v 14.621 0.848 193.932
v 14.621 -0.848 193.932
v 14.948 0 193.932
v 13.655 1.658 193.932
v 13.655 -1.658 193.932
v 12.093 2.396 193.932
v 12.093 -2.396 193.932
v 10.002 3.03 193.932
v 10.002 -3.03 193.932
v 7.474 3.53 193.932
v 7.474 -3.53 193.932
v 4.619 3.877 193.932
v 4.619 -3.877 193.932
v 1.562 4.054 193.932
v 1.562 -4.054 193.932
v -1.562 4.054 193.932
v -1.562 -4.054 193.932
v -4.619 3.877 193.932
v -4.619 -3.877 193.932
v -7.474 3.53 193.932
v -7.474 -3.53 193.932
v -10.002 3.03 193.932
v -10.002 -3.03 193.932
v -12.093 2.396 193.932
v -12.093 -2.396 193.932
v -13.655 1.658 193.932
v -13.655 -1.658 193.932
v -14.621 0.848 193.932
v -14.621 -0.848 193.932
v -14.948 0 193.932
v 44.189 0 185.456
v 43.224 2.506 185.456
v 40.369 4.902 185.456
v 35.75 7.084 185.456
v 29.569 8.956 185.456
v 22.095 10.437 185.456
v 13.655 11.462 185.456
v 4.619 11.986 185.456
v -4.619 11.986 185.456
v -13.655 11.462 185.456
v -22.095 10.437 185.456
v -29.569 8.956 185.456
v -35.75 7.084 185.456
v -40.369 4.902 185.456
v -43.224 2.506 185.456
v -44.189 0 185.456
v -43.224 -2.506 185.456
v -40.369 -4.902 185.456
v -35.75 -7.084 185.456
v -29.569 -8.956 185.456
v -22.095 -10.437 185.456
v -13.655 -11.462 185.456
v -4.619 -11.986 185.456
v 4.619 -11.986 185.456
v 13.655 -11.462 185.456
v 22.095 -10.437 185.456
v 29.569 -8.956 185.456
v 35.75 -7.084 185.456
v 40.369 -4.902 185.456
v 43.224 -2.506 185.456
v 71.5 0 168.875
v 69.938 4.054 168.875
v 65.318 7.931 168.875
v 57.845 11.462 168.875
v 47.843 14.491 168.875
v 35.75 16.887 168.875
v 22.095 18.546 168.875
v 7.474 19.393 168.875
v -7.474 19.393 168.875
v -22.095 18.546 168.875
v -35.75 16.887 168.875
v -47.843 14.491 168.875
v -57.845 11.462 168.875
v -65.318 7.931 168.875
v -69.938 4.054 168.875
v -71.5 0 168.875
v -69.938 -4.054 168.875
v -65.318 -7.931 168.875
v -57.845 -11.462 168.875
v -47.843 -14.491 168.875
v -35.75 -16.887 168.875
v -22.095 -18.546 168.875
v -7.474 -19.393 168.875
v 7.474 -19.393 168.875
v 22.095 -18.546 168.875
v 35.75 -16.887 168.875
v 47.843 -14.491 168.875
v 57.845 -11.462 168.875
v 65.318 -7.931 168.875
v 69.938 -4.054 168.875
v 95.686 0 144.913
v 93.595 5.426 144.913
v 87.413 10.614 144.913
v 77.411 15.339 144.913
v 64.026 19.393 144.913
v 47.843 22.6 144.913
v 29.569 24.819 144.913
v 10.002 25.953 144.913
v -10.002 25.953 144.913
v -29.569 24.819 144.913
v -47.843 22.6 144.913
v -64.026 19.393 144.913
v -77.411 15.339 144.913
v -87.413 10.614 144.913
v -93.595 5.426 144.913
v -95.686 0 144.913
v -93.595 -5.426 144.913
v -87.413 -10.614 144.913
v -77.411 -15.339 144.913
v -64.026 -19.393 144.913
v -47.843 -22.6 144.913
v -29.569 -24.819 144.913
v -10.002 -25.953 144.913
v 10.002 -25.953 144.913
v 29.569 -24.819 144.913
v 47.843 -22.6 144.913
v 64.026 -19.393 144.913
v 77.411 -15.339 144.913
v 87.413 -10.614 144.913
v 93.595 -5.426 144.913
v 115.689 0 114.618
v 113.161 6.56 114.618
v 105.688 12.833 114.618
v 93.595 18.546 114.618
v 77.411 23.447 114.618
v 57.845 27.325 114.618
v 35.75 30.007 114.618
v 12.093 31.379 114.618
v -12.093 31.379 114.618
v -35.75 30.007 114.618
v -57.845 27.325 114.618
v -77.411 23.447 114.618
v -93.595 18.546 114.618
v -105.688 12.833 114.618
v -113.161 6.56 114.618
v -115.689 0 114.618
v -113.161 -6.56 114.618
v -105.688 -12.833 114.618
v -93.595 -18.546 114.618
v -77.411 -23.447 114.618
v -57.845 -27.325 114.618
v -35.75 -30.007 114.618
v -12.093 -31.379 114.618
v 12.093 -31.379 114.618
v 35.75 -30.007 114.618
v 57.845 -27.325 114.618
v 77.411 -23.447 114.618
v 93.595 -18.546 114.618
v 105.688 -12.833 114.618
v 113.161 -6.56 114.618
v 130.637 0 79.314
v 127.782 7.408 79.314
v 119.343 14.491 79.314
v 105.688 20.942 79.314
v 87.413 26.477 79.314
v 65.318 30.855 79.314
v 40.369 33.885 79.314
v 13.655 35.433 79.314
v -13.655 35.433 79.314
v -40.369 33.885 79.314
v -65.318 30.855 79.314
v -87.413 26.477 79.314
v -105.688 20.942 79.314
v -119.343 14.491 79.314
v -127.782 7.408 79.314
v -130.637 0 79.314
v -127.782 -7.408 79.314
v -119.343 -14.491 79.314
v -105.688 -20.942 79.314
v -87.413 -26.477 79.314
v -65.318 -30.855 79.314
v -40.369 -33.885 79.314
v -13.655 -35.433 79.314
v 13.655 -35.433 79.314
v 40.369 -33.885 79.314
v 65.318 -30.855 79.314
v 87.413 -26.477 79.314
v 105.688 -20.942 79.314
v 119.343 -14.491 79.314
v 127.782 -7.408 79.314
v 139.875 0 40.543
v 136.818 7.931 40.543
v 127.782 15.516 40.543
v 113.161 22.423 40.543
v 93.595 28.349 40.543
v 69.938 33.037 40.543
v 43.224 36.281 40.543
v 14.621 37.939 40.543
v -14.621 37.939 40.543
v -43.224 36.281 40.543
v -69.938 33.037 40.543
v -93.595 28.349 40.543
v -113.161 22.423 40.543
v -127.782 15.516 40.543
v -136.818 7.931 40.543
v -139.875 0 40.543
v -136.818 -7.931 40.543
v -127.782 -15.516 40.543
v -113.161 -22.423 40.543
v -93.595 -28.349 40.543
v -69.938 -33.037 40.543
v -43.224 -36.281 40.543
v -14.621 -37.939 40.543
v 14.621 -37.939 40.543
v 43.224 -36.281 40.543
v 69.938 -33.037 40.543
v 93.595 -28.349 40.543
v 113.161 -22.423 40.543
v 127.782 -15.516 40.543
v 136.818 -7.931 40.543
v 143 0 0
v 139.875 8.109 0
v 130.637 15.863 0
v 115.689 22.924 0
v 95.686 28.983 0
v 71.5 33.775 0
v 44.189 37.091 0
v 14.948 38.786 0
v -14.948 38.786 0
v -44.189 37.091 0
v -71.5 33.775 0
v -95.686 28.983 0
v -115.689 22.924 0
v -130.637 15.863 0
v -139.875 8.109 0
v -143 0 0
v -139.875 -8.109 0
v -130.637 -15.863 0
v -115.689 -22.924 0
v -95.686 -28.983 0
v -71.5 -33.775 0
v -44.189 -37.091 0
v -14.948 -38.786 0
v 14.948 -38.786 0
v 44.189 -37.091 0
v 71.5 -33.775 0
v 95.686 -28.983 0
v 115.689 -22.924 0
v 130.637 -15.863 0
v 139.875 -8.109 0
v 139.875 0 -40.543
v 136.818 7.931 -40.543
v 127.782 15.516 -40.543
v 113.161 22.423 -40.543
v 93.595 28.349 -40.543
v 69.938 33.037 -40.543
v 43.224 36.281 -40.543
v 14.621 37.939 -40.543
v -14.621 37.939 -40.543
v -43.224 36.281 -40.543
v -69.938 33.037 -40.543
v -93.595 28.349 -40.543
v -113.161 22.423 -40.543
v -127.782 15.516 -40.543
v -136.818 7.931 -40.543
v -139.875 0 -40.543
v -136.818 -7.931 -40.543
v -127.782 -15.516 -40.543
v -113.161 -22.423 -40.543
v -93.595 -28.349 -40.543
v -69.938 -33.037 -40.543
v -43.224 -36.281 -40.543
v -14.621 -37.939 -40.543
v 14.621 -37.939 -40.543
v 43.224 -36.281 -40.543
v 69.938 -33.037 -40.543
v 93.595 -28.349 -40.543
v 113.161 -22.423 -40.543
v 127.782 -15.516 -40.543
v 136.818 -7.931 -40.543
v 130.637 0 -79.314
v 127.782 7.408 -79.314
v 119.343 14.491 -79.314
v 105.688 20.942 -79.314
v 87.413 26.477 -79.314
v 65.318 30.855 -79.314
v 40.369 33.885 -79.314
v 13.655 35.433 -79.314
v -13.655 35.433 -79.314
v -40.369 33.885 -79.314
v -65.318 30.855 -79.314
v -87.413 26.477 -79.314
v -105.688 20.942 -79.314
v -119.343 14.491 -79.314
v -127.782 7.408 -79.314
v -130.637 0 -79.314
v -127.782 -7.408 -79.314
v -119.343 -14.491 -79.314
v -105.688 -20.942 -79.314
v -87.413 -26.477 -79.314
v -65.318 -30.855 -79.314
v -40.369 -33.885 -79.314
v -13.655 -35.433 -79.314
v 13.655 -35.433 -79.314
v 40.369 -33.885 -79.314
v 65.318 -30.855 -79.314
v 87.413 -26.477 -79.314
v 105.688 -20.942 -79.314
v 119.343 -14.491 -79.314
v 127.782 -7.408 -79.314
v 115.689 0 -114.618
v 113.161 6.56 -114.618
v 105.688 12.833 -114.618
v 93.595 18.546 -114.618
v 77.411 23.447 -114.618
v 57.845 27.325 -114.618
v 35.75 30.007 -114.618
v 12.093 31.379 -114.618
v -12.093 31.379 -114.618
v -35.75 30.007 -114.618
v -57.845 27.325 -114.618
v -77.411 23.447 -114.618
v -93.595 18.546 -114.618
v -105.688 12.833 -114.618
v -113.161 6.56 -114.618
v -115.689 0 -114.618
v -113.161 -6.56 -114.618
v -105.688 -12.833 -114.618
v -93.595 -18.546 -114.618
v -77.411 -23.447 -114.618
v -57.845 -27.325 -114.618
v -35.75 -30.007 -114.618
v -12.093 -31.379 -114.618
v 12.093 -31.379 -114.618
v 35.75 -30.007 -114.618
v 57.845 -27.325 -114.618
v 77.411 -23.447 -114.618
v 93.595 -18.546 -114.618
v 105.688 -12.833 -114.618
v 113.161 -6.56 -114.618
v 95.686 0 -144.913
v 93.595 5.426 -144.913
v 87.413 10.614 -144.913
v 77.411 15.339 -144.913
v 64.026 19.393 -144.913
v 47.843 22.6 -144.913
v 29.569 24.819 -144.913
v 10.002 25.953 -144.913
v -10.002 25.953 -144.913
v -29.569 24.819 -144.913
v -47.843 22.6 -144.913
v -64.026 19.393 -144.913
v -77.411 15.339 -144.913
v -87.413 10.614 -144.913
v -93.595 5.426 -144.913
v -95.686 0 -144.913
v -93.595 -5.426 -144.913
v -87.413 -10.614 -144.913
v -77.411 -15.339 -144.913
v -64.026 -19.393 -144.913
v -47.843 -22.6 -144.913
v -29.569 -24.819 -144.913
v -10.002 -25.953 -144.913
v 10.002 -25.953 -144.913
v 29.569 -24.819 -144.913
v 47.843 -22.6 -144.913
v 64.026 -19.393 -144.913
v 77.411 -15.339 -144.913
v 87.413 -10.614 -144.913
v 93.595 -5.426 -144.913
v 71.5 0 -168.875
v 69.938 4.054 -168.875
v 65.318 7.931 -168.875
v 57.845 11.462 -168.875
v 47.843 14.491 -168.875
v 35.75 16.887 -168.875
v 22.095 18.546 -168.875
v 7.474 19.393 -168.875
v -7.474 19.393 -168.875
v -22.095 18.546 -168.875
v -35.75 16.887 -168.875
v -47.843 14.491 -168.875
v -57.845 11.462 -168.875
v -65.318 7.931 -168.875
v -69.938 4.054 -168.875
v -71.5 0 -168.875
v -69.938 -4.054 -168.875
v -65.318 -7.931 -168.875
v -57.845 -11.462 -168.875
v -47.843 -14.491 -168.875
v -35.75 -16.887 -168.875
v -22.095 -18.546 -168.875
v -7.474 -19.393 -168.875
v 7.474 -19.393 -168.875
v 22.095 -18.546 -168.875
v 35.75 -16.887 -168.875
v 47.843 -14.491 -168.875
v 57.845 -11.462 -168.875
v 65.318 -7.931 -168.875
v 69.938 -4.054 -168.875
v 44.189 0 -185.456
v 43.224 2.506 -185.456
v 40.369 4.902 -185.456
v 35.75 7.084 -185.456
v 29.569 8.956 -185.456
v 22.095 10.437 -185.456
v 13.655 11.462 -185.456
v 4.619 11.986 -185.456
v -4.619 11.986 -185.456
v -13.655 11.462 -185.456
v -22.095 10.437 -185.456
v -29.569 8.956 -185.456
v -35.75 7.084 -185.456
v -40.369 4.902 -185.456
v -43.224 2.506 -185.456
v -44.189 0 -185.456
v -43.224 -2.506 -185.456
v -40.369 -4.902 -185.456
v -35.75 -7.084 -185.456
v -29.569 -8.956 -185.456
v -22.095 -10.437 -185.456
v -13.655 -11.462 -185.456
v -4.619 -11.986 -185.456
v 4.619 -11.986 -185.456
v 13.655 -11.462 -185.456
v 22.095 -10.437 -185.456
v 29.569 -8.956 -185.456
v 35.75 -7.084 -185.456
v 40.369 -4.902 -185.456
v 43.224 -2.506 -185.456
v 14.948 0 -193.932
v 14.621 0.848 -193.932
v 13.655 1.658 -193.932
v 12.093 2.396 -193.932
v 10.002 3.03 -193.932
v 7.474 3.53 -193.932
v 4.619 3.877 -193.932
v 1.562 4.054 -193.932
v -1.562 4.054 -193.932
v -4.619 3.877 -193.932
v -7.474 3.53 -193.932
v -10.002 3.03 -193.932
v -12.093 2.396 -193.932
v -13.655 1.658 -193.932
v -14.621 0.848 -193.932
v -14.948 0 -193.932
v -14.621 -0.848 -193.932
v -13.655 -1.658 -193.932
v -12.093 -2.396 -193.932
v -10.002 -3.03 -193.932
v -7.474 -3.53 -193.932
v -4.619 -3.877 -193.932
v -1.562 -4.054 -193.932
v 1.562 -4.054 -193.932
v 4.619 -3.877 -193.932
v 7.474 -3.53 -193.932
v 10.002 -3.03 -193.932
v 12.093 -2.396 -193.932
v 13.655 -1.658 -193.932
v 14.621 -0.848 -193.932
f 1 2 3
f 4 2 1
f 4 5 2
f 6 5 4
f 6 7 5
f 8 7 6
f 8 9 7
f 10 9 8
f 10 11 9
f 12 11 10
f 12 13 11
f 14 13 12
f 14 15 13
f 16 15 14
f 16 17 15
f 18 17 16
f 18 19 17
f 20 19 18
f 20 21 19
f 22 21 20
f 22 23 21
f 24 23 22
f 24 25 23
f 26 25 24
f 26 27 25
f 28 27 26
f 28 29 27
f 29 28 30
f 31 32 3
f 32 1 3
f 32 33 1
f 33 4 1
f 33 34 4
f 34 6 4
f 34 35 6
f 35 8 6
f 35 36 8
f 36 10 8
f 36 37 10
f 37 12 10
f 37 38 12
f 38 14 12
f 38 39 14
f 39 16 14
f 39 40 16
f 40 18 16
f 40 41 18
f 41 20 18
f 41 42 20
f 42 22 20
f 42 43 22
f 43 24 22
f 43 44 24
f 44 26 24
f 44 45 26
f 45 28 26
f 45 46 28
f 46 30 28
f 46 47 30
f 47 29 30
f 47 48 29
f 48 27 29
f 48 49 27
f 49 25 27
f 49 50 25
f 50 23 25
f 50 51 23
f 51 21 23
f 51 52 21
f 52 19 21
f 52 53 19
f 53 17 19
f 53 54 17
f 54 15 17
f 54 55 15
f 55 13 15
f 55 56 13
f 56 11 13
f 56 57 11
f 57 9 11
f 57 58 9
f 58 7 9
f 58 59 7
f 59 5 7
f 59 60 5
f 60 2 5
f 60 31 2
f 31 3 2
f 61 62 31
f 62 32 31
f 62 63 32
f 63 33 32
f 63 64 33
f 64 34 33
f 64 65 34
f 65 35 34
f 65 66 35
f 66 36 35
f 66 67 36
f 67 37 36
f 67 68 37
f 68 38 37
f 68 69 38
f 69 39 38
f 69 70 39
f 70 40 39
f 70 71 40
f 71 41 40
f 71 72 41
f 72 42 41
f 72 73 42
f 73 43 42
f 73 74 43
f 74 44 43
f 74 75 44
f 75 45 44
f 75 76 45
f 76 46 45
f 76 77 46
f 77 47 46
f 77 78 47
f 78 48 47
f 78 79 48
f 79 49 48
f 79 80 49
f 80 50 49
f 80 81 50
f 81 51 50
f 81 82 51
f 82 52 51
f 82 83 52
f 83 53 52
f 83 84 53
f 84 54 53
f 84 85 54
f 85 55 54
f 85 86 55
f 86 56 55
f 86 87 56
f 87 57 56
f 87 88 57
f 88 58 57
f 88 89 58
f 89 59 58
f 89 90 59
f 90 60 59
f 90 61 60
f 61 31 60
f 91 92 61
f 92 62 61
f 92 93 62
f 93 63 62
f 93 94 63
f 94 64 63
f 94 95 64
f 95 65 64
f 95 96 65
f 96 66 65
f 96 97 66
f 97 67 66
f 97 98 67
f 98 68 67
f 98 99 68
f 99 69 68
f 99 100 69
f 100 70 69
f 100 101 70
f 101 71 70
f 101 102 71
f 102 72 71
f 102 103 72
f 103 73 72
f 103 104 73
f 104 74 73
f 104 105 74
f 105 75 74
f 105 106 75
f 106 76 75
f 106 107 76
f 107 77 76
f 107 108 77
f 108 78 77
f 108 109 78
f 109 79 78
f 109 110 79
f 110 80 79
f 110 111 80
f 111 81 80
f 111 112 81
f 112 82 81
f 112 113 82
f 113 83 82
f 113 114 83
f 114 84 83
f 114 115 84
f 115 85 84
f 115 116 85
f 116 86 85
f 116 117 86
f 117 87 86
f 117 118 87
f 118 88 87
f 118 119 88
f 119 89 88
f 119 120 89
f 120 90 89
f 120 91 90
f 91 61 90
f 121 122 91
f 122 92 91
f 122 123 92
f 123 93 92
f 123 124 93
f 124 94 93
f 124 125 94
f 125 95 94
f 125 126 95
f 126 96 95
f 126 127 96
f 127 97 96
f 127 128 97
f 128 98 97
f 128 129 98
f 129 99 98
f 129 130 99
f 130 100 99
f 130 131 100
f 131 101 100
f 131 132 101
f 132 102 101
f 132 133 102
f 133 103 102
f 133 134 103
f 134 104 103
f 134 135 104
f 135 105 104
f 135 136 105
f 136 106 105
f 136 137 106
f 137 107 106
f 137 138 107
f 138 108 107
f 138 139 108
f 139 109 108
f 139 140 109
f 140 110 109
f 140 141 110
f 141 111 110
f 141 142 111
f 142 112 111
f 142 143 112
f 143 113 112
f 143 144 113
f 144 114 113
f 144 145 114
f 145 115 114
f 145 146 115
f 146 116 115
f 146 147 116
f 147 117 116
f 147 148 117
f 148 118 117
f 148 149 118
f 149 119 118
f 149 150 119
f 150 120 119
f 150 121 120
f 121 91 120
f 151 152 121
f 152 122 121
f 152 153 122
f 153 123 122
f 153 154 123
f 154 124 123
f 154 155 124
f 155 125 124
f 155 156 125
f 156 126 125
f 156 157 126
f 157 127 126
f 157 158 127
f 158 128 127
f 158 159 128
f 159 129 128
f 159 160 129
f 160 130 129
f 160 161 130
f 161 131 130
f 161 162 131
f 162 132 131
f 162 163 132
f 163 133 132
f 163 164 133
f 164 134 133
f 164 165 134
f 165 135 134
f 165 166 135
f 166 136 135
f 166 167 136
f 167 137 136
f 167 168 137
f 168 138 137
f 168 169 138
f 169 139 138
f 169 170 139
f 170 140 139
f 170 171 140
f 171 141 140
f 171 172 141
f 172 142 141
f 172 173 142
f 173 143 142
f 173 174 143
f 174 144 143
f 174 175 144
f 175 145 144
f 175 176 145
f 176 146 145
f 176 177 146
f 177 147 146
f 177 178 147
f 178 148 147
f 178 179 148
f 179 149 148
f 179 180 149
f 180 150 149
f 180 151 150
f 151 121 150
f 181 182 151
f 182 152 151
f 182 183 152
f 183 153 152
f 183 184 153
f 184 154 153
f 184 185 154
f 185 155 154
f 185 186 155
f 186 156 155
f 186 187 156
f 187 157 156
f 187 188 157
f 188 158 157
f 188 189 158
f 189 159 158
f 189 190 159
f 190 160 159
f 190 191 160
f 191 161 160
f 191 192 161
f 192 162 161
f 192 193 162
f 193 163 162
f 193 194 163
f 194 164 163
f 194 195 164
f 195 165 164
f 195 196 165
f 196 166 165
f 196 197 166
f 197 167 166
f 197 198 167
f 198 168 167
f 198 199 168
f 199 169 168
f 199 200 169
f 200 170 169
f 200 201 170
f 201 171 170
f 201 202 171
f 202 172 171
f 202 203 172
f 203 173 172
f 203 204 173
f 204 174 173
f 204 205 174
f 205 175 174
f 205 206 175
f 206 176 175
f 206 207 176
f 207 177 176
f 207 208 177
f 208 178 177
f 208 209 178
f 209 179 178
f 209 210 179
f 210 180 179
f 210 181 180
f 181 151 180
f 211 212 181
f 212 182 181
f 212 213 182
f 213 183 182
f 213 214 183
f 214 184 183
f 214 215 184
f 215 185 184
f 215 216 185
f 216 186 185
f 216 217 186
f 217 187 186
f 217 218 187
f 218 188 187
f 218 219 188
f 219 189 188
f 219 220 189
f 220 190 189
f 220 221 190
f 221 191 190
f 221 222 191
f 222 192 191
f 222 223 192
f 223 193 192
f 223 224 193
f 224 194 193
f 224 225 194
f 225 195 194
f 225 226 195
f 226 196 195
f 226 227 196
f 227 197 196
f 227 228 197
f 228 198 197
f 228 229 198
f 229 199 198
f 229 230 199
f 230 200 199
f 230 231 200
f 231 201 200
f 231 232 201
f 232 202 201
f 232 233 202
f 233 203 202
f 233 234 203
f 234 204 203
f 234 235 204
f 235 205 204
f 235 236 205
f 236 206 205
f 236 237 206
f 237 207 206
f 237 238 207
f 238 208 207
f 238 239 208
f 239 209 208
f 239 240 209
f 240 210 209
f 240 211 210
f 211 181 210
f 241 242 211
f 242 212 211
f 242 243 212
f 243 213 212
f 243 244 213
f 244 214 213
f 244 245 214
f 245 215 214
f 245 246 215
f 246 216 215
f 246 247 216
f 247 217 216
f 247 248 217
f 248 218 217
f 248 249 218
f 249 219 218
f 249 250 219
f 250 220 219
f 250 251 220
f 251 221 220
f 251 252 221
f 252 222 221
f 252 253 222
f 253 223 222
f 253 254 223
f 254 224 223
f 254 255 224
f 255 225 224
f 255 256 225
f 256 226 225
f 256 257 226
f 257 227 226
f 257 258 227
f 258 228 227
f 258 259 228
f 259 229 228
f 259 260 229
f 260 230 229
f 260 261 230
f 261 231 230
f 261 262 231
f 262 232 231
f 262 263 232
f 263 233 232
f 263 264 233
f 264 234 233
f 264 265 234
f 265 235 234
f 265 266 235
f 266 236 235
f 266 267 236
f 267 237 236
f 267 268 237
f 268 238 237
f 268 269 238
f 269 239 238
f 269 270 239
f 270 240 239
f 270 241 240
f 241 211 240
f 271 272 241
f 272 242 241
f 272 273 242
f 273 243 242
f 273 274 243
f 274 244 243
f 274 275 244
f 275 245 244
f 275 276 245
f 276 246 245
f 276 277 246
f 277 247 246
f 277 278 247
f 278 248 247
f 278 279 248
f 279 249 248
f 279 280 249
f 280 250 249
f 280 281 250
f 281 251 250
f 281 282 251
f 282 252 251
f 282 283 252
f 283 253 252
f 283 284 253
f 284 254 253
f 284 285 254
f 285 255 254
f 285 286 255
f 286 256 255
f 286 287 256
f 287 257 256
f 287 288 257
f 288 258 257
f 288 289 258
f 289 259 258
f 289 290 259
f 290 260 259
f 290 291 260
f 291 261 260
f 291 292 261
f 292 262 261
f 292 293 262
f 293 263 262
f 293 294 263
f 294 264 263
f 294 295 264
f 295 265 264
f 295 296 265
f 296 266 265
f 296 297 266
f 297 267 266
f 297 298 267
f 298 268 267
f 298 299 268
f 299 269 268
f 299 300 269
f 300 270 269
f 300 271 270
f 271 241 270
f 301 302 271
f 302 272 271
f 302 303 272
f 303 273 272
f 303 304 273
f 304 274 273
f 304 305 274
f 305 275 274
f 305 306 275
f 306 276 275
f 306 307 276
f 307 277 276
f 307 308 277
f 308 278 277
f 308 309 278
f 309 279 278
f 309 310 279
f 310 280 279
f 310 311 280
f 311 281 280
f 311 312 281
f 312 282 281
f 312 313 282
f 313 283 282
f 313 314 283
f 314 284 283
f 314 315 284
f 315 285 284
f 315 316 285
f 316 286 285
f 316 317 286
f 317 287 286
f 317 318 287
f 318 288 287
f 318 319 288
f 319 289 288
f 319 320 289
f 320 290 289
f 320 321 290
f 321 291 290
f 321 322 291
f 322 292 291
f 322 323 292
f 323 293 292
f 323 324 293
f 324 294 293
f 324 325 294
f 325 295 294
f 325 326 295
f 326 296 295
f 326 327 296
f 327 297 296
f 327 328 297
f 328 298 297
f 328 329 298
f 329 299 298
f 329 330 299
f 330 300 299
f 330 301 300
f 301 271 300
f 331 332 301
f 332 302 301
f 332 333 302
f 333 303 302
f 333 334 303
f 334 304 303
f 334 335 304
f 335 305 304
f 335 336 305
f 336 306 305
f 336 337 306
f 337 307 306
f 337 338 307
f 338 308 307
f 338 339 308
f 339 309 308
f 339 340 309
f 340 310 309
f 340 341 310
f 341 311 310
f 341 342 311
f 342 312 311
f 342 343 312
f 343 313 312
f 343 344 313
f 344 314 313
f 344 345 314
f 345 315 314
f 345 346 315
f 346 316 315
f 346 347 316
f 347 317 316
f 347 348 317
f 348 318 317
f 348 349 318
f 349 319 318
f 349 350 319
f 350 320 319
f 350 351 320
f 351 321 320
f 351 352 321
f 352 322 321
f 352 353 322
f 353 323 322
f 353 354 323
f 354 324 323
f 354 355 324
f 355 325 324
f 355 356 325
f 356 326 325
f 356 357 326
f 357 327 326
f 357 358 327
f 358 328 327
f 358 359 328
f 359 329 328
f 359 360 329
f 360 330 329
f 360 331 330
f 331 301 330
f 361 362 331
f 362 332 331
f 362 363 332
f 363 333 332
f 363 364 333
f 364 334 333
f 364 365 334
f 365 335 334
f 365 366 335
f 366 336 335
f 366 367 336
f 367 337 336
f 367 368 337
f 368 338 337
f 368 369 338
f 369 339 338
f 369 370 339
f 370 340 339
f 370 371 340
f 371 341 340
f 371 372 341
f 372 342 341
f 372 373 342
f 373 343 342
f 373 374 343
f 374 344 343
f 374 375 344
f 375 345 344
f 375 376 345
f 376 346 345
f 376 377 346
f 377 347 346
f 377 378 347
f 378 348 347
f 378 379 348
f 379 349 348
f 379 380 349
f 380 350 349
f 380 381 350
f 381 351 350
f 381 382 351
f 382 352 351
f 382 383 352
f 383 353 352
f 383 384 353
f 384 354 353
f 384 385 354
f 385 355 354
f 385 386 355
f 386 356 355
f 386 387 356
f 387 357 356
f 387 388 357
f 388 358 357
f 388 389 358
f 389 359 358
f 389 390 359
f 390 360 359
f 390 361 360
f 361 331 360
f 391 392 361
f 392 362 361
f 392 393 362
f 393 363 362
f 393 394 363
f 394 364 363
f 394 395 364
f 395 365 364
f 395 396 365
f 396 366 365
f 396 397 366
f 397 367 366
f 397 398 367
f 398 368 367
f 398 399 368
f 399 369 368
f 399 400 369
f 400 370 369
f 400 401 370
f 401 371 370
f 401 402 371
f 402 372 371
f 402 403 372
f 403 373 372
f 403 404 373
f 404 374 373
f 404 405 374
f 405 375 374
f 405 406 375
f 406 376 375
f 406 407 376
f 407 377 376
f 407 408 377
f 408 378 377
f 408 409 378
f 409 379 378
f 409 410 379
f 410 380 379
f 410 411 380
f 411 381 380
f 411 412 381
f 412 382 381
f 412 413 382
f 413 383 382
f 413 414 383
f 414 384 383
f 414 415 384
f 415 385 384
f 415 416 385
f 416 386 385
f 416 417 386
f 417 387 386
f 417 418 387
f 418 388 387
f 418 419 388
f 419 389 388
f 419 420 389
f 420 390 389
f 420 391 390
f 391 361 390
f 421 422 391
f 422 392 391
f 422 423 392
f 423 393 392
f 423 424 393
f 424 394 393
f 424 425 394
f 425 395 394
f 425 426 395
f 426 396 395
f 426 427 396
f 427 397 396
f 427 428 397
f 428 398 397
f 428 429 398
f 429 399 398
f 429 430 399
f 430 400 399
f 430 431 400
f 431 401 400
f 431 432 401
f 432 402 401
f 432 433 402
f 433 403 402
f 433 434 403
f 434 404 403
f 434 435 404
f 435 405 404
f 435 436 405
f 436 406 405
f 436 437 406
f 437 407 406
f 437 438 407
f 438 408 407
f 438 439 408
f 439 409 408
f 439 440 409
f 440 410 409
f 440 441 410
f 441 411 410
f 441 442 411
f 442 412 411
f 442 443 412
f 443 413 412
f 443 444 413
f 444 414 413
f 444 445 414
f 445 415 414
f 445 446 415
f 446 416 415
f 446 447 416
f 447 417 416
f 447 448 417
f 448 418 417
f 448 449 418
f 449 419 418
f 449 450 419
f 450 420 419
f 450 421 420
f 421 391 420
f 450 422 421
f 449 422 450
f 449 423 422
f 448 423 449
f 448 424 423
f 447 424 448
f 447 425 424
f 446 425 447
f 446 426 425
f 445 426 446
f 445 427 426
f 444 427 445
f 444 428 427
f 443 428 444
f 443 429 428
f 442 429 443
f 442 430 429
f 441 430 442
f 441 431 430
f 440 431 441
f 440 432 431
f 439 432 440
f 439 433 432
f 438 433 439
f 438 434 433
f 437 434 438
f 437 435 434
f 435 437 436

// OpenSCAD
// Generated by SolidPython 1.0.1 on 2020-07-29 00:46:49


scale(v = [11, 3, 15]) {
	sphere(r = 13);
}
/***********************************************
*********      SolidPython code:      **********
************************************************
 
# import packages: SolidPython
from solid import *
from solid.utils import *
from itertools import chain, combinations, permutations


class Resize:

    def __init__(self, scad_file):
        self.scad_file = scad_file
        #self.scad_file = import_scad(scad_file)
        # cone/cylinder param:
        self.r1 = 0
        self.r2 = 0
        self.h = 0
        # rectangular prism param:
        self.w = 0
        self.l = 0
        # ellipse param:
        self.r = 0

    # import OpenScad code (file name corresponds to shape)


    # classify shape + parameters
    def assign(self, param1, param2, param3):
        if self.scad_file == 'cone.scad':
            self.r1 = param1
            self.r2 = param2
            self.h = param3
        elif self.scad_file == 'cylinder.scad':
            self.r1 = param1
            self.r2 = param2
            self.h = param3
        elif self.scad_file == 'rectangularPrism.scad':
            self.h = param1
            self.l = param2
            self.w = param3
        else:
            self.r = param1
            self.h = param2

    # resize parameters
    def iterate(self):
        x = range(3, 20, 2)
        i = 1
        if self.scad_file == 'cone.scad':
            tempList = list(permutations(x, 2))
            for temp in tempList:
                param1 = temp[0]
                param2 = temp[1]
                filepath = 'produced_scad_files/' + 'cone' + str(param1) + '_' + str(param2) + '_' + '.scad'
                scad_render_to_file(cylinder(h=param1, r1=param2, r2=0), filepath)

        elif self.scad_file == 'cylinder.scad':
            tempList = list(permutations(x, 3))
            for temp in tempList:
                param1 = temp[0]
                param2 = temp[1]
                filepath = 'produced_scad_files/' + 'cylinder' + str(param1) + '_' + str(param2) + '_' + '.scad'
                scad_render_to_file(cylinder(h=param1, r1=param2, r2=param2), filepath)

        elif self.scad_file == 'rectangularPrism.scad':
            tempList = list(permutations(x, 3))
            for temp in tempList:
                param1 = temp[0]
                param2 = temp[1]
                param3 = temp[2]
                filepath = 'produced_scad_files/' + 'rectangularPrism' + str(param1) + '_' + str(param2) + '_' + str(
                    param3) + '.scad'
                scad_render_to_file(cube(size=(param1, param2, param3)), filepath)

        elif self.scad_file == 'ellipse.scad':
            tempList = list(permutations(x, 4))
            for temp in tempList:
                param1 = temp[0]
                param2 = temp[1]
                param3 = temp[2]
                param4 = temp[3]
                filepath = 'produced_scad_files/' + 'ellipse' + str(param1) + '_' + str(param2) + '_' + str(param3) + '_' + str(param4) + '.scad'
                scad_render_to_file(scale([param1, param2, param3])(sphere(r=param4)), filepath)

    def render_to_scadfile(self):
        scad_render_to_file(scad, 'example.scad') 
 
************************************************/
